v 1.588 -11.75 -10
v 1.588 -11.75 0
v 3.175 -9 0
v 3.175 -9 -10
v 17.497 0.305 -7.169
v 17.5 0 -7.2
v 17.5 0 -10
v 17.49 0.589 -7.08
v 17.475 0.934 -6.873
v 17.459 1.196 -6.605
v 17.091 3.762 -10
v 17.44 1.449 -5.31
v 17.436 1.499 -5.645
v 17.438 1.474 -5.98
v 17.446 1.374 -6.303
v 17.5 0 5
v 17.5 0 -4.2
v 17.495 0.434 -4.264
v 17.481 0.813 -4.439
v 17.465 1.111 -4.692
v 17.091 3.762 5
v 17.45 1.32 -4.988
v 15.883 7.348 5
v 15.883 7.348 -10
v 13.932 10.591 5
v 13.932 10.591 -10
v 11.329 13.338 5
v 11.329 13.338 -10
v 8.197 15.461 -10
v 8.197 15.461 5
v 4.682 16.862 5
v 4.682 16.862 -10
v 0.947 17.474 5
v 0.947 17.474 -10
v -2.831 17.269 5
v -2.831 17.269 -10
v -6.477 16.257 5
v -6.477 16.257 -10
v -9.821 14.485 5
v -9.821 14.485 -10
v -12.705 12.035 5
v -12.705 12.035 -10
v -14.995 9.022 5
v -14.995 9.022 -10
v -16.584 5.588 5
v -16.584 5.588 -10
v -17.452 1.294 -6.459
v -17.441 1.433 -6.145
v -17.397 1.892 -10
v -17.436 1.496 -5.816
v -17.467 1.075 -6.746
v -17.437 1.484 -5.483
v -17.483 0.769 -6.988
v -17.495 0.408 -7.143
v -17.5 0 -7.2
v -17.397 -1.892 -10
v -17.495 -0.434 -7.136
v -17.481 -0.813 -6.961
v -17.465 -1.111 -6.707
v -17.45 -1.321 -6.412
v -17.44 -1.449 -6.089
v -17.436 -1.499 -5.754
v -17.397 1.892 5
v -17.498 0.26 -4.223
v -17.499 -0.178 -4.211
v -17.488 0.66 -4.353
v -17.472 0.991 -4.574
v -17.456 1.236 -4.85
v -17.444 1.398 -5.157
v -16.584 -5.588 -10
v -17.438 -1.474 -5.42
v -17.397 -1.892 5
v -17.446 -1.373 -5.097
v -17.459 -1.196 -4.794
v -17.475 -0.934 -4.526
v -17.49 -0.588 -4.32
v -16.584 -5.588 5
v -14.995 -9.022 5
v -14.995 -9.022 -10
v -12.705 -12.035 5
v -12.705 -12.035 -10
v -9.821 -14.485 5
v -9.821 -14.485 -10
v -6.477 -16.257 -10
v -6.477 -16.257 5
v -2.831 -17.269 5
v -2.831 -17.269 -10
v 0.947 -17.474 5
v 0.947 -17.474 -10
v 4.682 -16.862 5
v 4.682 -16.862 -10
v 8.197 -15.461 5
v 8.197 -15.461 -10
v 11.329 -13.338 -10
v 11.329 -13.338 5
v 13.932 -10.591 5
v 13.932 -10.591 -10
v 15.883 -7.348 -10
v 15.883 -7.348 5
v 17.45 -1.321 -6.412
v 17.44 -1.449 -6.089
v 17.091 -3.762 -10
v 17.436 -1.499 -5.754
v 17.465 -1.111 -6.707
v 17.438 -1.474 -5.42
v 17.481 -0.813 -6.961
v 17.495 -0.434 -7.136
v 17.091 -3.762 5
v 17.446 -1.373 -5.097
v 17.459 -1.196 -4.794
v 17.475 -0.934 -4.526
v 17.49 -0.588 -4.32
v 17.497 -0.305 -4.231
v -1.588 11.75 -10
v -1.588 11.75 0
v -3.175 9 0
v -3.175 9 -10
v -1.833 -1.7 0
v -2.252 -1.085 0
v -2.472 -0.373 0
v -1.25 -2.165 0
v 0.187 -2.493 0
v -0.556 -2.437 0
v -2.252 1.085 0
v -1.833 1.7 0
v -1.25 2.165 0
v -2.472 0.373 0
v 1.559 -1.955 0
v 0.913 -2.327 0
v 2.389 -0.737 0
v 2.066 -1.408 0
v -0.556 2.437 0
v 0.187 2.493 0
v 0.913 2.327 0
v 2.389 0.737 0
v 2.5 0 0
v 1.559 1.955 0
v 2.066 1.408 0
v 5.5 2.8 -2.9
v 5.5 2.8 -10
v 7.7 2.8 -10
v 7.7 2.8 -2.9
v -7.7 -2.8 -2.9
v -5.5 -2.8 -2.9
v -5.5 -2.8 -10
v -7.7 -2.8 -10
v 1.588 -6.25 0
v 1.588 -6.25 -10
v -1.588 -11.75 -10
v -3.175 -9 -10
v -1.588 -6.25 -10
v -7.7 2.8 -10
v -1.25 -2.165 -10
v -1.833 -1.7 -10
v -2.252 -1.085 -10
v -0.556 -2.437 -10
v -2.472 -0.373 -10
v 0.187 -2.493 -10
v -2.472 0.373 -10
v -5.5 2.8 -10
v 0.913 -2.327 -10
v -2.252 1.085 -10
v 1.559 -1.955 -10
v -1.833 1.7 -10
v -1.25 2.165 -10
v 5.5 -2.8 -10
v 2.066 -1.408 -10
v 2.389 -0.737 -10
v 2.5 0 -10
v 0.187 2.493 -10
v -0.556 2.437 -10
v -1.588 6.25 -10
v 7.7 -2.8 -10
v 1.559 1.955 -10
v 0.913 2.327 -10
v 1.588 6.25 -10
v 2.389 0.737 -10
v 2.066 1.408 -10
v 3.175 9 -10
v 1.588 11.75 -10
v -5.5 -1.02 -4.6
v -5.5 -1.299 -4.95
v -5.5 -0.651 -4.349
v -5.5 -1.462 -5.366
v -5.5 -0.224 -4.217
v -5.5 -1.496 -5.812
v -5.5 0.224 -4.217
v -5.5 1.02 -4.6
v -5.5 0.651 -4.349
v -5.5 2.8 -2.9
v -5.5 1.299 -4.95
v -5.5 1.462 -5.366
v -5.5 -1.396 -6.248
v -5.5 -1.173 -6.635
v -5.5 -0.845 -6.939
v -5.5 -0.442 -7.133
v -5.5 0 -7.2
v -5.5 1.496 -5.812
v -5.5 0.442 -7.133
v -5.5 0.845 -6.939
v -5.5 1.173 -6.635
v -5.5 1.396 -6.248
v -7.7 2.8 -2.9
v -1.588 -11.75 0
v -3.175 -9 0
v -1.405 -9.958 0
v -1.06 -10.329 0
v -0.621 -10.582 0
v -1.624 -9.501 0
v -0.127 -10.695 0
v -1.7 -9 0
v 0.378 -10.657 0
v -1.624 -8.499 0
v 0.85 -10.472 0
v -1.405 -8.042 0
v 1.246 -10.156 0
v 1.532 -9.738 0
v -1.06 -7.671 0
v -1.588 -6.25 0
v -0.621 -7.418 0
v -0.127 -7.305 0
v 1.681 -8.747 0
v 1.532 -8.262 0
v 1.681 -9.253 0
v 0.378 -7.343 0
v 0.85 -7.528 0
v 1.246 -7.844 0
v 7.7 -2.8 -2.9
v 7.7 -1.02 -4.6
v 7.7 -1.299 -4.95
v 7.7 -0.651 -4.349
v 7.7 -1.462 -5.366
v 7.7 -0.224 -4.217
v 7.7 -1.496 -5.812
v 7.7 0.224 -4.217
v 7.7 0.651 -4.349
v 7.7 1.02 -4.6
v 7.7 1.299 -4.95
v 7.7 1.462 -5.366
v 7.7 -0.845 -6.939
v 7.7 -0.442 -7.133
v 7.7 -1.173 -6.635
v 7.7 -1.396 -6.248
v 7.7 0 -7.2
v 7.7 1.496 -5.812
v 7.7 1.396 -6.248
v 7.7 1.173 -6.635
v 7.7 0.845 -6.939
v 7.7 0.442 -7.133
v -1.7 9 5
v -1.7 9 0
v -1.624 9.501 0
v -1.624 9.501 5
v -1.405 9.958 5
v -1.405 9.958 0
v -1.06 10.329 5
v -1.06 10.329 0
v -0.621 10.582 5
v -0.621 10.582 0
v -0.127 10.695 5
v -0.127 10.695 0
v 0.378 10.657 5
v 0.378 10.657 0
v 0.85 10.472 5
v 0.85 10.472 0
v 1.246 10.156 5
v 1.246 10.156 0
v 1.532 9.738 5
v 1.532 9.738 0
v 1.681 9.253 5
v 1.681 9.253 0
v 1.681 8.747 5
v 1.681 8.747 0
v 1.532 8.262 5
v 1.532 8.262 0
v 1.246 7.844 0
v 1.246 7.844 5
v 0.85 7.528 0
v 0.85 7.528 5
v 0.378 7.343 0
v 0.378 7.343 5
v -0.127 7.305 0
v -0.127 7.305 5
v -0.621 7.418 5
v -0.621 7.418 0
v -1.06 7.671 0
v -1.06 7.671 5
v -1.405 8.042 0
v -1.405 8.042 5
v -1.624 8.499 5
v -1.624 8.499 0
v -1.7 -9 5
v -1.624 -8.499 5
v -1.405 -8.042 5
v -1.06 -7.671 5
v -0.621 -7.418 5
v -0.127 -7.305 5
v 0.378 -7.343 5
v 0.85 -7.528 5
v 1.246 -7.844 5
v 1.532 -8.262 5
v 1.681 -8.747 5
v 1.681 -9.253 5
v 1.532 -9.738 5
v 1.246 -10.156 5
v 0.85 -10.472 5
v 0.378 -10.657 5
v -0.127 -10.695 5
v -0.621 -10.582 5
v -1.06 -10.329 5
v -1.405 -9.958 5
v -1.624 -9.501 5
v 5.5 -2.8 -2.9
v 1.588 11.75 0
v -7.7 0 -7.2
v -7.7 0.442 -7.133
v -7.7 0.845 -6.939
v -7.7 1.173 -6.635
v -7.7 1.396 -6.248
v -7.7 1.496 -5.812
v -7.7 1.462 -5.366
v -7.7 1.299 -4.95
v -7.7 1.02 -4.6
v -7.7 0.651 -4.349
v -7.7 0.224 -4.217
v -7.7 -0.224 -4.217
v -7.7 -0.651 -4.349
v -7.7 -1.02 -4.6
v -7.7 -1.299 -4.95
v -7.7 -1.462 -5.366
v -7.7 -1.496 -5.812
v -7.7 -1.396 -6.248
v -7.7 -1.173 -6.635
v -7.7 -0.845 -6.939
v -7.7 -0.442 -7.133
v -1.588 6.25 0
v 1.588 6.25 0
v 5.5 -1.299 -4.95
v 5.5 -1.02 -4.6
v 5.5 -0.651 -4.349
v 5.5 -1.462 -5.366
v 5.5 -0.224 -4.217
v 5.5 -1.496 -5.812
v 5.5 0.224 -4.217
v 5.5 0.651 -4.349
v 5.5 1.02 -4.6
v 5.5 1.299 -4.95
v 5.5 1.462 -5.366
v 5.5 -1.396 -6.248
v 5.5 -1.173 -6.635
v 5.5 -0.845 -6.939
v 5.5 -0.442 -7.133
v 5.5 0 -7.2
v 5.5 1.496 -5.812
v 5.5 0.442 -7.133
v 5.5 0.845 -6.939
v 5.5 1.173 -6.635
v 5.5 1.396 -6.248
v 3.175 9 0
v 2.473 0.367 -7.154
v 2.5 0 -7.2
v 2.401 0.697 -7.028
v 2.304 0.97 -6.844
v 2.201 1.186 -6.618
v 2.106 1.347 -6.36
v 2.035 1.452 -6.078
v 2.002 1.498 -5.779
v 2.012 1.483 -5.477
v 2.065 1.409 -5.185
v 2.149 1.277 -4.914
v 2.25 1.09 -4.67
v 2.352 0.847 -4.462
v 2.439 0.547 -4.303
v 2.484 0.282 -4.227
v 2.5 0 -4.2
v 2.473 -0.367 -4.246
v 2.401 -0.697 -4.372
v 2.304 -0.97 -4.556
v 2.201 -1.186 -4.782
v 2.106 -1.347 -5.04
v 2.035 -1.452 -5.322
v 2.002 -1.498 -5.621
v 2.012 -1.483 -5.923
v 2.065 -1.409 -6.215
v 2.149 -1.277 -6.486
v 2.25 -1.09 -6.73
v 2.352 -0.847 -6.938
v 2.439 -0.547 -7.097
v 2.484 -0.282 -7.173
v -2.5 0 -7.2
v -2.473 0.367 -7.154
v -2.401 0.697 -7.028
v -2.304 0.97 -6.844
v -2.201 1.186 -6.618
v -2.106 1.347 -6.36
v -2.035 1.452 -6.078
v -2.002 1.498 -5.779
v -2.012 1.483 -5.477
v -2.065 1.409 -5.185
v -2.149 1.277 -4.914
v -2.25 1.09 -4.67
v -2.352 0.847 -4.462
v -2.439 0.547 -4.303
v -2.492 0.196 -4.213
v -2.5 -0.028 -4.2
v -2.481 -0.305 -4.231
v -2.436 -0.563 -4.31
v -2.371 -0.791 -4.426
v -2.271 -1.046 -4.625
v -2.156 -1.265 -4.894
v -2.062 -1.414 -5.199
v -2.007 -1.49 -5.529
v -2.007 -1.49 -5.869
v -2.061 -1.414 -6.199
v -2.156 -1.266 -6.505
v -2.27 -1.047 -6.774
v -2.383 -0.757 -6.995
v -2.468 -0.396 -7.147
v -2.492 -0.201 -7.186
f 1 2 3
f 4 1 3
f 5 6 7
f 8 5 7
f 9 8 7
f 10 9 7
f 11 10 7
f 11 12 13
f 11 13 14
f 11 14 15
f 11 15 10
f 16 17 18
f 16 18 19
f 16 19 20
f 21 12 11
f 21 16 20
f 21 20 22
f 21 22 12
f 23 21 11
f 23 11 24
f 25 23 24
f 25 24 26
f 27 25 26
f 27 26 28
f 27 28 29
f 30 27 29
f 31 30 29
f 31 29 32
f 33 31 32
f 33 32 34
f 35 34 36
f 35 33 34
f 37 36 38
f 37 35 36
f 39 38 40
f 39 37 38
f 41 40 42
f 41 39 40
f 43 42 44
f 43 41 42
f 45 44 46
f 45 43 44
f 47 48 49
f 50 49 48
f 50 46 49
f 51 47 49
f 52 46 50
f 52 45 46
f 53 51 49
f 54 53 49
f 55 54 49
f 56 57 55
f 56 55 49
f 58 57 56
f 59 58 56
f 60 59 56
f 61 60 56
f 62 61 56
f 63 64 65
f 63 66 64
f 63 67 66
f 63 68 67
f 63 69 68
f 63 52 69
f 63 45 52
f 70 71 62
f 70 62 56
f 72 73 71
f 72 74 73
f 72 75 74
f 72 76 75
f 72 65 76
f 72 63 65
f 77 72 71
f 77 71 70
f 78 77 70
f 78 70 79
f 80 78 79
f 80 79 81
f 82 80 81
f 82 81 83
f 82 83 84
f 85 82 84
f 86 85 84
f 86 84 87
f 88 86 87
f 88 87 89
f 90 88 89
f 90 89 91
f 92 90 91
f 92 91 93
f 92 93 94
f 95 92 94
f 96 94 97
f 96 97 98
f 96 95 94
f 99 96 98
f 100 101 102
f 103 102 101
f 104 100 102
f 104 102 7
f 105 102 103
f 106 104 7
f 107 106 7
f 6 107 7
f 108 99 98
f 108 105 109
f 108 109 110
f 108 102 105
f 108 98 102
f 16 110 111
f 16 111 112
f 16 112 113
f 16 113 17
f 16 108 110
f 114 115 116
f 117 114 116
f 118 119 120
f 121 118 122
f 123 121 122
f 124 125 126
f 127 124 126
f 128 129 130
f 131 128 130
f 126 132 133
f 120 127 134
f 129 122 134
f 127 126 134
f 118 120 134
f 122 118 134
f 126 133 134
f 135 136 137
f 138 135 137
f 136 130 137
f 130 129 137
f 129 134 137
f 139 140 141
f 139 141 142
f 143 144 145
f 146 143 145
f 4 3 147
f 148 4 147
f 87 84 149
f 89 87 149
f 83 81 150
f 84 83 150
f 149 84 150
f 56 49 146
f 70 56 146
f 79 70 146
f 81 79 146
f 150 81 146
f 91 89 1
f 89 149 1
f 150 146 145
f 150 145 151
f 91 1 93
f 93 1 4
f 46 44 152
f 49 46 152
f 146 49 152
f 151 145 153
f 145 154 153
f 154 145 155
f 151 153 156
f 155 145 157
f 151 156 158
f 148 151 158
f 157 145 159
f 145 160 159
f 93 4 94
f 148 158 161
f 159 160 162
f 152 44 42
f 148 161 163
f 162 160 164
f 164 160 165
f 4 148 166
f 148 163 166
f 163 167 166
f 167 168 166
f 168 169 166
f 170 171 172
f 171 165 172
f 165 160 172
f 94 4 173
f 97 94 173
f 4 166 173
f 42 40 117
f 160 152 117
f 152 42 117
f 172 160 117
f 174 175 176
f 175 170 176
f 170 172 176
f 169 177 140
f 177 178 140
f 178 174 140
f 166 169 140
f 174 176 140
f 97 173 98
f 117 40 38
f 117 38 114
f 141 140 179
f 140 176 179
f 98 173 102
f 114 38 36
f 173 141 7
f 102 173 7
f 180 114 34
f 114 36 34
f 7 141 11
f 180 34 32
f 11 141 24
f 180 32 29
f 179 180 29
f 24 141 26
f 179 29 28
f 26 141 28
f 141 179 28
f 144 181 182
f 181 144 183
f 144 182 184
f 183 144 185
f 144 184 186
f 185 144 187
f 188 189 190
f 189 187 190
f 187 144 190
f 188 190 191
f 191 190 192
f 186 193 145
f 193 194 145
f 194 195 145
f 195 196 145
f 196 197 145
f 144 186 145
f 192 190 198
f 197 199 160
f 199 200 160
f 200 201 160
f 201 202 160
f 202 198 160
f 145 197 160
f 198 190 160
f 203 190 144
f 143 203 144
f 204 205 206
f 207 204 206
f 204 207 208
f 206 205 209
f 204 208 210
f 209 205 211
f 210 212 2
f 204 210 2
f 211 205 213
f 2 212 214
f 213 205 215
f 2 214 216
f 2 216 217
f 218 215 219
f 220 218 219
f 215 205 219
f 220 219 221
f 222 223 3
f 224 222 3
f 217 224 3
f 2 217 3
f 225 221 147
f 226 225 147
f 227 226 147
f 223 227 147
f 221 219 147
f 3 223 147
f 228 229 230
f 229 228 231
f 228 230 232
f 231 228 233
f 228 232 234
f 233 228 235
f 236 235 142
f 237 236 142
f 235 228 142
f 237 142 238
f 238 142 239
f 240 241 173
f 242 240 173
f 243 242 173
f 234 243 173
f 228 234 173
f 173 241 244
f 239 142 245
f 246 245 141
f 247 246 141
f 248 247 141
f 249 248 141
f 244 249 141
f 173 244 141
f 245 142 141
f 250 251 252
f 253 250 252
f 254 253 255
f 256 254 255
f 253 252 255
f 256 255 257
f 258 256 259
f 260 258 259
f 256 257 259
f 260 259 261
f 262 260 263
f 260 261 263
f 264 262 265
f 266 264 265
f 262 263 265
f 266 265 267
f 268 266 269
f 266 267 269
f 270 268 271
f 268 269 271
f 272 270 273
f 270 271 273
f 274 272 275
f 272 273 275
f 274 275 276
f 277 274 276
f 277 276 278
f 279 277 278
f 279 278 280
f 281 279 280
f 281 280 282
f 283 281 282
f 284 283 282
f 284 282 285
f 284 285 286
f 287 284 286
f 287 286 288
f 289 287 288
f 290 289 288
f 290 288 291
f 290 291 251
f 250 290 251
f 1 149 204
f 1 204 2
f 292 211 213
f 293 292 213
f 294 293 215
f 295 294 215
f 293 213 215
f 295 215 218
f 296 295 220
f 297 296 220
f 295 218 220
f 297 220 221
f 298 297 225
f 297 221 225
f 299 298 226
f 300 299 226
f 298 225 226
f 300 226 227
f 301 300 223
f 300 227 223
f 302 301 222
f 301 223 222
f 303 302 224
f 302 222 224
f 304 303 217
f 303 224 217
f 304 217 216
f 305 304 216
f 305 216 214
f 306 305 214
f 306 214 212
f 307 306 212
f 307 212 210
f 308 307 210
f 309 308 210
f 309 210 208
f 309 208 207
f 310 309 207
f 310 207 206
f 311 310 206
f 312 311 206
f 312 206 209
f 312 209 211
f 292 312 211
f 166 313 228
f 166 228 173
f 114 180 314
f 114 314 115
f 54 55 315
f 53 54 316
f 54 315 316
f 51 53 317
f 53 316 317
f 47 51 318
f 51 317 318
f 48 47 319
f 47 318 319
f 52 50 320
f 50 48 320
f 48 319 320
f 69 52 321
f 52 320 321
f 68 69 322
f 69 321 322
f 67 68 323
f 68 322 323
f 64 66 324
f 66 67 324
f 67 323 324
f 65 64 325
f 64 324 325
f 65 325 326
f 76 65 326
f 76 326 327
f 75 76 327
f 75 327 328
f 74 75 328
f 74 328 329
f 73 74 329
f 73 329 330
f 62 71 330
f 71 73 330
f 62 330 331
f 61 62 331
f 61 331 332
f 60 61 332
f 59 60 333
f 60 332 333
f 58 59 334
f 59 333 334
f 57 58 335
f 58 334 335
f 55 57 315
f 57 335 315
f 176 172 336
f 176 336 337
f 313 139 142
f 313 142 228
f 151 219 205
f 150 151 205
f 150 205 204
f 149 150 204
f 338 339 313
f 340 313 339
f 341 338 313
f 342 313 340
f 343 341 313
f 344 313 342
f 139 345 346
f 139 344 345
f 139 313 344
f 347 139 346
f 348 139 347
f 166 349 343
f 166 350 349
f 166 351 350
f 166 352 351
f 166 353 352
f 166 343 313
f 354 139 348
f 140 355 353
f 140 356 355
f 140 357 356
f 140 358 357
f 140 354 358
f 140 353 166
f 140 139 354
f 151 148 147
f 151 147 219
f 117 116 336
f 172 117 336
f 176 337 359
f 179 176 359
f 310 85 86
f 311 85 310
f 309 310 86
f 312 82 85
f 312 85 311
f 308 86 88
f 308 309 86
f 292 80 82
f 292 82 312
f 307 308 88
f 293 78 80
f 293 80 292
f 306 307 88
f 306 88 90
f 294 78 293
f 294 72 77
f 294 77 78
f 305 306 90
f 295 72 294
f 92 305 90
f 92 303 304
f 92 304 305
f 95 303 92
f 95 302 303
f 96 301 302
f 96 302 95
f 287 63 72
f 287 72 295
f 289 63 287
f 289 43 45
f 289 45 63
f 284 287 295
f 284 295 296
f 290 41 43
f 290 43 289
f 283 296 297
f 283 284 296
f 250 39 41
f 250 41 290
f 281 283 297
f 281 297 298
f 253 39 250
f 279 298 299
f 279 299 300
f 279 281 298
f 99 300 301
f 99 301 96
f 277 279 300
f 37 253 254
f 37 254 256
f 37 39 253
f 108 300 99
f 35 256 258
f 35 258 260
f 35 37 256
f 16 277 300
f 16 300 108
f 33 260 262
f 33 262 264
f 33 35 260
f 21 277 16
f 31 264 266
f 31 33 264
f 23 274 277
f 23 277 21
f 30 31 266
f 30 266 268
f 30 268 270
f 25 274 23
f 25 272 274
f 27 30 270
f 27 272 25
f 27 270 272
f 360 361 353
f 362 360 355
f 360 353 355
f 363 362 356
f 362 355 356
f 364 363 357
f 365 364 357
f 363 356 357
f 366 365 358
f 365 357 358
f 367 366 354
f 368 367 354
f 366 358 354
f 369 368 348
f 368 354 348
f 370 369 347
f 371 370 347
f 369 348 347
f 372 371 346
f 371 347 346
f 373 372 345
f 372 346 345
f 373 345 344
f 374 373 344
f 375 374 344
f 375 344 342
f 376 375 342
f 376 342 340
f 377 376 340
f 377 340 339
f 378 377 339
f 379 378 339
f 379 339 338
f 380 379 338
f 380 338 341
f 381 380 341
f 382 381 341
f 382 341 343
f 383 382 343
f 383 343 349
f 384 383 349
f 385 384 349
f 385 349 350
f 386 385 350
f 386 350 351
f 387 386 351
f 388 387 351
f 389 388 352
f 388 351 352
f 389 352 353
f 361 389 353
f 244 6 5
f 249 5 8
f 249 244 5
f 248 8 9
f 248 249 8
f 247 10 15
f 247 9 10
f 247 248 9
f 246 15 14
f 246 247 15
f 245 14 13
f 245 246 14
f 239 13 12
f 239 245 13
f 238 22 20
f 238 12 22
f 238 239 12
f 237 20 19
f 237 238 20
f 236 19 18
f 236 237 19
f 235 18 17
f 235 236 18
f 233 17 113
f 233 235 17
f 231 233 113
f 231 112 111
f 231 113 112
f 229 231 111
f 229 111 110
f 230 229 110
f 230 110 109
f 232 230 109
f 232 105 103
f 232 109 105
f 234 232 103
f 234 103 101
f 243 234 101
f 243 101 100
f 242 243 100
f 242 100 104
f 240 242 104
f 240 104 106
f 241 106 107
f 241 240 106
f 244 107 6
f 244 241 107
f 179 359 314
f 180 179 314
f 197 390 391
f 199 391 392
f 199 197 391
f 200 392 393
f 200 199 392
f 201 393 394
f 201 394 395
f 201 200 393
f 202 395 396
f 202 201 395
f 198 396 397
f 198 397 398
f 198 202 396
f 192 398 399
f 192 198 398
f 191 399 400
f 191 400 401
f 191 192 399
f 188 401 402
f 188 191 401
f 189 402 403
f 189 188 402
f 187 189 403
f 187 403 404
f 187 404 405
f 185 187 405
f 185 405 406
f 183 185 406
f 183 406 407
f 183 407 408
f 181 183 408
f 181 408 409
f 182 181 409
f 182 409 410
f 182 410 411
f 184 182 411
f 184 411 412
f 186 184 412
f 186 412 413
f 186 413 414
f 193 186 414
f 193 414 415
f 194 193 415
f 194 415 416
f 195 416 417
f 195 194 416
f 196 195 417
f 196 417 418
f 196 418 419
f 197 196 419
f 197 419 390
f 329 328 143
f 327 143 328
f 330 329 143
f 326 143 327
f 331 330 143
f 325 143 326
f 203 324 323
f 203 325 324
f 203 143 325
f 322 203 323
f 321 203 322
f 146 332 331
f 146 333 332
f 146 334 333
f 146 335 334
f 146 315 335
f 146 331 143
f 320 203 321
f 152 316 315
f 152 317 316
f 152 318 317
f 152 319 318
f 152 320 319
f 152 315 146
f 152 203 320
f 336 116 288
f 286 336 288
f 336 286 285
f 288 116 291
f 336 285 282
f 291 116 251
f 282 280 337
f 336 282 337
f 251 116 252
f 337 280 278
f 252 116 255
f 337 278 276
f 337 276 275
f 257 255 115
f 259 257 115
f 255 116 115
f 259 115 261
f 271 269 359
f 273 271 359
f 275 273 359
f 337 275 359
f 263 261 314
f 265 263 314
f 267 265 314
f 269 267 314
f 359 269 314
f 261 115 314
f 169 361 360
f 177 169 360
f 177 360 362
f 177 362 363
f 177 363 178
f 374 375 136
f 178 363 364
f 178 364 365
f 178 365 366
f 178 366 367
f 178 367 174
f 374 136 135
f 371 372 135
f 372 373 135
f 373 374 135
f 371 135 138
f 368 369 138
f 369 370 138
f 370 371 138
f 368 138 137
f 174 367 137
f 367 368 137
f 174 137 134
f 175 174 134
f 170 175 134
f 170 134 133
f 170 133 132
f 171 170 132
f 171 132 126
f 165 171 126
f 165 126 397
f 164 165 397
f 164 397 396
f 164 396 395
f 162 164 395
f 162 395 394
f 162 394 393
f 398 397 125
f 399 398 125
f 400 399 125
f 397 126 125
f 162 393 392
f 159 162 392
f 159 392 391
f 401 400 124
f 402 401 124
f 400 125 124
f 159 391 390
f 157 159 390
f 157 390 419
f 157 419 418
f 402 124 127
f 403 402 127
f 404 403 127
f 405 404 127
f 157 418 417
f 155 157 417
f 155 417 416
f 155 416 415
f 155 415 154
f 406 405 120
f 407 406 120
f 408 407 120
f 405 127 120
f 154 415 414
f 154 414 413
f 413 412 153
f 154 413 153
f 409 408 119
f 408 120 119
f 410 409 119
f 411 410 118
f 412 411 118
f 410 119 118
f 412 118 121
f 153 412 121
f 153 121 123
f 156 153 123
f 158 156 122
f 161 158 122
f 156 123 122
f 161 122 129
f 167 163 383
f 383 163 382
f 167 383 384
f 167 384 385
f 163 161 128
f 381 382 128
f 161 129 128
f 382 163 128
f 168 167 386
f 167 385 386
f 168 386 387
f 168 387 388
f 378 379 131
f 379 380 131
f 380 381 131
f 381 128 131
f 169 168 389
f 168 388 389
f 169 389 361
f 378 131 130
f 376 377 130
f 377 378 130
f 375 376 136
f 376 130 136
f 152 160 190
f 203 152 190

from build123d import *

# Parameters (mm, degrees)
SKETCH1_R                           = 17.5
SKETCH1_R_2                         = 2.5
BOSS_EXTRUDE1_DEPTH                 = 10
BOSS_EXTRUDE2_START                 = 5
SKETCH1_3_R                         = 17.5
BOSS_EXTRUDE2_DEPTH                 = 5
M3_CLEARANCE_HOLE1_D                = 3.4
CUT_EXTRUDE1_REACH                  = 32.582
CUT_EXTRUDE1_END_RADIUS             = 17.5
SKETCH8_R                           = 1.5
CUT_EXTRUDE1_DIRECTION_2_REACH      = 32.582
CUT_EXTRUDE1_DIRECTION_2_END_RADIUS = 2.5
CUT_EXTRUDE2_DEPTH                  = 2.2


with BuildPart() as part:
    # Sketch1 → Boss-Extrude1 (new body)
    with BuildSketch(Plane.XY):
        Circle(SKETCH1_R)
        Circle(SKETCH1_R_2, mode=Mode.SUBTRACT)
        Polygon((1.58771324, 11.75), (-1.58771324, 11.75), (-3.175426481, 9), (-1.58771324, 6.25), (1.58771324, 6.25), (3.175426481, 9), align=None, mode=Mode.SUBTRACT)
        Polygon((1.58771324, -6.25), (-1.58771324, -6.25), (-3.175426481, -9), (-1.58771324, -11.75), (1.58771324, -11.75), (3.175426481, -9), align=None, mode=Mode.SUBTRACT)
    extrude(amount=-BOSS_EXTRUDE1_DEPTH)

    # Sketch1<3> → Boss-Extrude2 (add)
    with BuildSketch(Plane.XY.offset(BOSS_EXTRUDE2_START)):
        Circle(SKETCH1_3_R)
    extrude(amount=-BOSS_EXTRUDE2_DEPTH)

    # M3 Clearance Hole1 (through all)
    with Locations(Plane.XY.offset(5)):
        with Locations((0, 9), (0, -9)):
            Hole(M3_CLEARANCE_HOLE1_D / 2)

    # Cut-Extrude1: up to this cylinder (the profile starts inside it)
    cut_extrude1_end = Plane(origin=(0, 0, -5.7), z_dir=(0, 0, 1)) * Cylinder(CUT_EXTRUDE1_END_RADIUS, 101.164, mode=Mode.PRIVATE)
    # Sketch8 → Cut-Extrude1 (cut, up to the surface)
    with BuildSketch(Plane(origin=(5.5, 0, 0), x_dir=(0, 0, -1), z_dir=(1, 0, 0)), mode=Mode.PRIVATE) as cut_extrude1_sk1:
        with Locations((5.7, 0)):
            Circle(SKETCH8_R)
    cut_extrude1_tool1 = extrude(cut_extrude1_sk1.sketch, amount=CUT_EXTRUDE1_REACH, mode=Mode.PRIVATE) & cut_extrude1_end
    cut_extrude1 = cut_extrude1_tool1.solids().sort_by_distance((5.5, 0, -5.7))[0]
    add(cut_extrude1, mode=Mode.SUBTRACT)

    # Cut-Extrude1 direction 2: up to this cylinder (the profile starts outside it)
    cut_extrude1_direction_2_end = Plane(origin=(0, 0, -5.7), z_dir=(0, 0, 1)) * Cylinder(CUT_EXTRUDE1_DIRECTION_2_END_RADIUS, 71.164, mode=Mode.PRIVATE)
    # Sketch8 → Cut-Extrude1 direction 2 (cut, up to the surface)
    with BuildSketch(Plane(origin=(5.5, 0, 0), x_dir=(0, 0, -1), z_dir=(1, 0, 0)), mode=Mode.PRIVATE) as cut_extrude1_direction_2_sk1:
        with Locations((5.7, 0)):
            Circle(SKETCH8_R)
    cut_extrude1_direction_2_tool1 = extrude(cut_extrude1_direction_2_sk1.sketch, amount=-CUT_EXTRUDE1_DIRECTION_2_REACH, mode=Mode.PRIVATE) - cut_extrude1_direction_2_end
    cut_extrude1_direction_2 = cut_extrude1_direction_2_tool1.solids().sort_by_distance((5.5, 0, -5.7))[0]
    add(cut_extrude1_direction_2, mode=Mode.SUBTRACT)
    cut_extrude1 = cut_extrude1 + cut_extrude1_direction_2  # both directions under the feature's name, for the pattern or mirror that repeats it

    # Sketch8<4> → Cut-Extrude2 (cut)
    with BuildSketch(Plane(origin=(5.5, 0, 0), x_dir=(0, 0, -1), z_dir=(1, 0, 0))):
        Polygon((8.5, 2.8), (2.9, 2.8), (2.9, -2.8), (8.5, -2.8), (10, -2.8), (10, 2.8), align=None)
    cut_extrude2 = extrude(amount=CUT_EXTRUDE2_DEPTH, mode=Mode.SUBTRACT)

    # Mirror1: Cut-Extrude1, Cut-Extrude2 across plane
    add(cut_extrude1.mirror(Plane(origin=(0, 0, 0), x_dir=(0, 0, 1), z_dir=(1, 0, 0))), mode=Mode.SUBTRACT)
    add(cut_extrude2.mirror(Plane(origin=(0, 0, 0), x_dir=(0, 0, 1), z_dir=(1, 0, 0))), mode=Mode.SUBTRACT)


solid = part.part
